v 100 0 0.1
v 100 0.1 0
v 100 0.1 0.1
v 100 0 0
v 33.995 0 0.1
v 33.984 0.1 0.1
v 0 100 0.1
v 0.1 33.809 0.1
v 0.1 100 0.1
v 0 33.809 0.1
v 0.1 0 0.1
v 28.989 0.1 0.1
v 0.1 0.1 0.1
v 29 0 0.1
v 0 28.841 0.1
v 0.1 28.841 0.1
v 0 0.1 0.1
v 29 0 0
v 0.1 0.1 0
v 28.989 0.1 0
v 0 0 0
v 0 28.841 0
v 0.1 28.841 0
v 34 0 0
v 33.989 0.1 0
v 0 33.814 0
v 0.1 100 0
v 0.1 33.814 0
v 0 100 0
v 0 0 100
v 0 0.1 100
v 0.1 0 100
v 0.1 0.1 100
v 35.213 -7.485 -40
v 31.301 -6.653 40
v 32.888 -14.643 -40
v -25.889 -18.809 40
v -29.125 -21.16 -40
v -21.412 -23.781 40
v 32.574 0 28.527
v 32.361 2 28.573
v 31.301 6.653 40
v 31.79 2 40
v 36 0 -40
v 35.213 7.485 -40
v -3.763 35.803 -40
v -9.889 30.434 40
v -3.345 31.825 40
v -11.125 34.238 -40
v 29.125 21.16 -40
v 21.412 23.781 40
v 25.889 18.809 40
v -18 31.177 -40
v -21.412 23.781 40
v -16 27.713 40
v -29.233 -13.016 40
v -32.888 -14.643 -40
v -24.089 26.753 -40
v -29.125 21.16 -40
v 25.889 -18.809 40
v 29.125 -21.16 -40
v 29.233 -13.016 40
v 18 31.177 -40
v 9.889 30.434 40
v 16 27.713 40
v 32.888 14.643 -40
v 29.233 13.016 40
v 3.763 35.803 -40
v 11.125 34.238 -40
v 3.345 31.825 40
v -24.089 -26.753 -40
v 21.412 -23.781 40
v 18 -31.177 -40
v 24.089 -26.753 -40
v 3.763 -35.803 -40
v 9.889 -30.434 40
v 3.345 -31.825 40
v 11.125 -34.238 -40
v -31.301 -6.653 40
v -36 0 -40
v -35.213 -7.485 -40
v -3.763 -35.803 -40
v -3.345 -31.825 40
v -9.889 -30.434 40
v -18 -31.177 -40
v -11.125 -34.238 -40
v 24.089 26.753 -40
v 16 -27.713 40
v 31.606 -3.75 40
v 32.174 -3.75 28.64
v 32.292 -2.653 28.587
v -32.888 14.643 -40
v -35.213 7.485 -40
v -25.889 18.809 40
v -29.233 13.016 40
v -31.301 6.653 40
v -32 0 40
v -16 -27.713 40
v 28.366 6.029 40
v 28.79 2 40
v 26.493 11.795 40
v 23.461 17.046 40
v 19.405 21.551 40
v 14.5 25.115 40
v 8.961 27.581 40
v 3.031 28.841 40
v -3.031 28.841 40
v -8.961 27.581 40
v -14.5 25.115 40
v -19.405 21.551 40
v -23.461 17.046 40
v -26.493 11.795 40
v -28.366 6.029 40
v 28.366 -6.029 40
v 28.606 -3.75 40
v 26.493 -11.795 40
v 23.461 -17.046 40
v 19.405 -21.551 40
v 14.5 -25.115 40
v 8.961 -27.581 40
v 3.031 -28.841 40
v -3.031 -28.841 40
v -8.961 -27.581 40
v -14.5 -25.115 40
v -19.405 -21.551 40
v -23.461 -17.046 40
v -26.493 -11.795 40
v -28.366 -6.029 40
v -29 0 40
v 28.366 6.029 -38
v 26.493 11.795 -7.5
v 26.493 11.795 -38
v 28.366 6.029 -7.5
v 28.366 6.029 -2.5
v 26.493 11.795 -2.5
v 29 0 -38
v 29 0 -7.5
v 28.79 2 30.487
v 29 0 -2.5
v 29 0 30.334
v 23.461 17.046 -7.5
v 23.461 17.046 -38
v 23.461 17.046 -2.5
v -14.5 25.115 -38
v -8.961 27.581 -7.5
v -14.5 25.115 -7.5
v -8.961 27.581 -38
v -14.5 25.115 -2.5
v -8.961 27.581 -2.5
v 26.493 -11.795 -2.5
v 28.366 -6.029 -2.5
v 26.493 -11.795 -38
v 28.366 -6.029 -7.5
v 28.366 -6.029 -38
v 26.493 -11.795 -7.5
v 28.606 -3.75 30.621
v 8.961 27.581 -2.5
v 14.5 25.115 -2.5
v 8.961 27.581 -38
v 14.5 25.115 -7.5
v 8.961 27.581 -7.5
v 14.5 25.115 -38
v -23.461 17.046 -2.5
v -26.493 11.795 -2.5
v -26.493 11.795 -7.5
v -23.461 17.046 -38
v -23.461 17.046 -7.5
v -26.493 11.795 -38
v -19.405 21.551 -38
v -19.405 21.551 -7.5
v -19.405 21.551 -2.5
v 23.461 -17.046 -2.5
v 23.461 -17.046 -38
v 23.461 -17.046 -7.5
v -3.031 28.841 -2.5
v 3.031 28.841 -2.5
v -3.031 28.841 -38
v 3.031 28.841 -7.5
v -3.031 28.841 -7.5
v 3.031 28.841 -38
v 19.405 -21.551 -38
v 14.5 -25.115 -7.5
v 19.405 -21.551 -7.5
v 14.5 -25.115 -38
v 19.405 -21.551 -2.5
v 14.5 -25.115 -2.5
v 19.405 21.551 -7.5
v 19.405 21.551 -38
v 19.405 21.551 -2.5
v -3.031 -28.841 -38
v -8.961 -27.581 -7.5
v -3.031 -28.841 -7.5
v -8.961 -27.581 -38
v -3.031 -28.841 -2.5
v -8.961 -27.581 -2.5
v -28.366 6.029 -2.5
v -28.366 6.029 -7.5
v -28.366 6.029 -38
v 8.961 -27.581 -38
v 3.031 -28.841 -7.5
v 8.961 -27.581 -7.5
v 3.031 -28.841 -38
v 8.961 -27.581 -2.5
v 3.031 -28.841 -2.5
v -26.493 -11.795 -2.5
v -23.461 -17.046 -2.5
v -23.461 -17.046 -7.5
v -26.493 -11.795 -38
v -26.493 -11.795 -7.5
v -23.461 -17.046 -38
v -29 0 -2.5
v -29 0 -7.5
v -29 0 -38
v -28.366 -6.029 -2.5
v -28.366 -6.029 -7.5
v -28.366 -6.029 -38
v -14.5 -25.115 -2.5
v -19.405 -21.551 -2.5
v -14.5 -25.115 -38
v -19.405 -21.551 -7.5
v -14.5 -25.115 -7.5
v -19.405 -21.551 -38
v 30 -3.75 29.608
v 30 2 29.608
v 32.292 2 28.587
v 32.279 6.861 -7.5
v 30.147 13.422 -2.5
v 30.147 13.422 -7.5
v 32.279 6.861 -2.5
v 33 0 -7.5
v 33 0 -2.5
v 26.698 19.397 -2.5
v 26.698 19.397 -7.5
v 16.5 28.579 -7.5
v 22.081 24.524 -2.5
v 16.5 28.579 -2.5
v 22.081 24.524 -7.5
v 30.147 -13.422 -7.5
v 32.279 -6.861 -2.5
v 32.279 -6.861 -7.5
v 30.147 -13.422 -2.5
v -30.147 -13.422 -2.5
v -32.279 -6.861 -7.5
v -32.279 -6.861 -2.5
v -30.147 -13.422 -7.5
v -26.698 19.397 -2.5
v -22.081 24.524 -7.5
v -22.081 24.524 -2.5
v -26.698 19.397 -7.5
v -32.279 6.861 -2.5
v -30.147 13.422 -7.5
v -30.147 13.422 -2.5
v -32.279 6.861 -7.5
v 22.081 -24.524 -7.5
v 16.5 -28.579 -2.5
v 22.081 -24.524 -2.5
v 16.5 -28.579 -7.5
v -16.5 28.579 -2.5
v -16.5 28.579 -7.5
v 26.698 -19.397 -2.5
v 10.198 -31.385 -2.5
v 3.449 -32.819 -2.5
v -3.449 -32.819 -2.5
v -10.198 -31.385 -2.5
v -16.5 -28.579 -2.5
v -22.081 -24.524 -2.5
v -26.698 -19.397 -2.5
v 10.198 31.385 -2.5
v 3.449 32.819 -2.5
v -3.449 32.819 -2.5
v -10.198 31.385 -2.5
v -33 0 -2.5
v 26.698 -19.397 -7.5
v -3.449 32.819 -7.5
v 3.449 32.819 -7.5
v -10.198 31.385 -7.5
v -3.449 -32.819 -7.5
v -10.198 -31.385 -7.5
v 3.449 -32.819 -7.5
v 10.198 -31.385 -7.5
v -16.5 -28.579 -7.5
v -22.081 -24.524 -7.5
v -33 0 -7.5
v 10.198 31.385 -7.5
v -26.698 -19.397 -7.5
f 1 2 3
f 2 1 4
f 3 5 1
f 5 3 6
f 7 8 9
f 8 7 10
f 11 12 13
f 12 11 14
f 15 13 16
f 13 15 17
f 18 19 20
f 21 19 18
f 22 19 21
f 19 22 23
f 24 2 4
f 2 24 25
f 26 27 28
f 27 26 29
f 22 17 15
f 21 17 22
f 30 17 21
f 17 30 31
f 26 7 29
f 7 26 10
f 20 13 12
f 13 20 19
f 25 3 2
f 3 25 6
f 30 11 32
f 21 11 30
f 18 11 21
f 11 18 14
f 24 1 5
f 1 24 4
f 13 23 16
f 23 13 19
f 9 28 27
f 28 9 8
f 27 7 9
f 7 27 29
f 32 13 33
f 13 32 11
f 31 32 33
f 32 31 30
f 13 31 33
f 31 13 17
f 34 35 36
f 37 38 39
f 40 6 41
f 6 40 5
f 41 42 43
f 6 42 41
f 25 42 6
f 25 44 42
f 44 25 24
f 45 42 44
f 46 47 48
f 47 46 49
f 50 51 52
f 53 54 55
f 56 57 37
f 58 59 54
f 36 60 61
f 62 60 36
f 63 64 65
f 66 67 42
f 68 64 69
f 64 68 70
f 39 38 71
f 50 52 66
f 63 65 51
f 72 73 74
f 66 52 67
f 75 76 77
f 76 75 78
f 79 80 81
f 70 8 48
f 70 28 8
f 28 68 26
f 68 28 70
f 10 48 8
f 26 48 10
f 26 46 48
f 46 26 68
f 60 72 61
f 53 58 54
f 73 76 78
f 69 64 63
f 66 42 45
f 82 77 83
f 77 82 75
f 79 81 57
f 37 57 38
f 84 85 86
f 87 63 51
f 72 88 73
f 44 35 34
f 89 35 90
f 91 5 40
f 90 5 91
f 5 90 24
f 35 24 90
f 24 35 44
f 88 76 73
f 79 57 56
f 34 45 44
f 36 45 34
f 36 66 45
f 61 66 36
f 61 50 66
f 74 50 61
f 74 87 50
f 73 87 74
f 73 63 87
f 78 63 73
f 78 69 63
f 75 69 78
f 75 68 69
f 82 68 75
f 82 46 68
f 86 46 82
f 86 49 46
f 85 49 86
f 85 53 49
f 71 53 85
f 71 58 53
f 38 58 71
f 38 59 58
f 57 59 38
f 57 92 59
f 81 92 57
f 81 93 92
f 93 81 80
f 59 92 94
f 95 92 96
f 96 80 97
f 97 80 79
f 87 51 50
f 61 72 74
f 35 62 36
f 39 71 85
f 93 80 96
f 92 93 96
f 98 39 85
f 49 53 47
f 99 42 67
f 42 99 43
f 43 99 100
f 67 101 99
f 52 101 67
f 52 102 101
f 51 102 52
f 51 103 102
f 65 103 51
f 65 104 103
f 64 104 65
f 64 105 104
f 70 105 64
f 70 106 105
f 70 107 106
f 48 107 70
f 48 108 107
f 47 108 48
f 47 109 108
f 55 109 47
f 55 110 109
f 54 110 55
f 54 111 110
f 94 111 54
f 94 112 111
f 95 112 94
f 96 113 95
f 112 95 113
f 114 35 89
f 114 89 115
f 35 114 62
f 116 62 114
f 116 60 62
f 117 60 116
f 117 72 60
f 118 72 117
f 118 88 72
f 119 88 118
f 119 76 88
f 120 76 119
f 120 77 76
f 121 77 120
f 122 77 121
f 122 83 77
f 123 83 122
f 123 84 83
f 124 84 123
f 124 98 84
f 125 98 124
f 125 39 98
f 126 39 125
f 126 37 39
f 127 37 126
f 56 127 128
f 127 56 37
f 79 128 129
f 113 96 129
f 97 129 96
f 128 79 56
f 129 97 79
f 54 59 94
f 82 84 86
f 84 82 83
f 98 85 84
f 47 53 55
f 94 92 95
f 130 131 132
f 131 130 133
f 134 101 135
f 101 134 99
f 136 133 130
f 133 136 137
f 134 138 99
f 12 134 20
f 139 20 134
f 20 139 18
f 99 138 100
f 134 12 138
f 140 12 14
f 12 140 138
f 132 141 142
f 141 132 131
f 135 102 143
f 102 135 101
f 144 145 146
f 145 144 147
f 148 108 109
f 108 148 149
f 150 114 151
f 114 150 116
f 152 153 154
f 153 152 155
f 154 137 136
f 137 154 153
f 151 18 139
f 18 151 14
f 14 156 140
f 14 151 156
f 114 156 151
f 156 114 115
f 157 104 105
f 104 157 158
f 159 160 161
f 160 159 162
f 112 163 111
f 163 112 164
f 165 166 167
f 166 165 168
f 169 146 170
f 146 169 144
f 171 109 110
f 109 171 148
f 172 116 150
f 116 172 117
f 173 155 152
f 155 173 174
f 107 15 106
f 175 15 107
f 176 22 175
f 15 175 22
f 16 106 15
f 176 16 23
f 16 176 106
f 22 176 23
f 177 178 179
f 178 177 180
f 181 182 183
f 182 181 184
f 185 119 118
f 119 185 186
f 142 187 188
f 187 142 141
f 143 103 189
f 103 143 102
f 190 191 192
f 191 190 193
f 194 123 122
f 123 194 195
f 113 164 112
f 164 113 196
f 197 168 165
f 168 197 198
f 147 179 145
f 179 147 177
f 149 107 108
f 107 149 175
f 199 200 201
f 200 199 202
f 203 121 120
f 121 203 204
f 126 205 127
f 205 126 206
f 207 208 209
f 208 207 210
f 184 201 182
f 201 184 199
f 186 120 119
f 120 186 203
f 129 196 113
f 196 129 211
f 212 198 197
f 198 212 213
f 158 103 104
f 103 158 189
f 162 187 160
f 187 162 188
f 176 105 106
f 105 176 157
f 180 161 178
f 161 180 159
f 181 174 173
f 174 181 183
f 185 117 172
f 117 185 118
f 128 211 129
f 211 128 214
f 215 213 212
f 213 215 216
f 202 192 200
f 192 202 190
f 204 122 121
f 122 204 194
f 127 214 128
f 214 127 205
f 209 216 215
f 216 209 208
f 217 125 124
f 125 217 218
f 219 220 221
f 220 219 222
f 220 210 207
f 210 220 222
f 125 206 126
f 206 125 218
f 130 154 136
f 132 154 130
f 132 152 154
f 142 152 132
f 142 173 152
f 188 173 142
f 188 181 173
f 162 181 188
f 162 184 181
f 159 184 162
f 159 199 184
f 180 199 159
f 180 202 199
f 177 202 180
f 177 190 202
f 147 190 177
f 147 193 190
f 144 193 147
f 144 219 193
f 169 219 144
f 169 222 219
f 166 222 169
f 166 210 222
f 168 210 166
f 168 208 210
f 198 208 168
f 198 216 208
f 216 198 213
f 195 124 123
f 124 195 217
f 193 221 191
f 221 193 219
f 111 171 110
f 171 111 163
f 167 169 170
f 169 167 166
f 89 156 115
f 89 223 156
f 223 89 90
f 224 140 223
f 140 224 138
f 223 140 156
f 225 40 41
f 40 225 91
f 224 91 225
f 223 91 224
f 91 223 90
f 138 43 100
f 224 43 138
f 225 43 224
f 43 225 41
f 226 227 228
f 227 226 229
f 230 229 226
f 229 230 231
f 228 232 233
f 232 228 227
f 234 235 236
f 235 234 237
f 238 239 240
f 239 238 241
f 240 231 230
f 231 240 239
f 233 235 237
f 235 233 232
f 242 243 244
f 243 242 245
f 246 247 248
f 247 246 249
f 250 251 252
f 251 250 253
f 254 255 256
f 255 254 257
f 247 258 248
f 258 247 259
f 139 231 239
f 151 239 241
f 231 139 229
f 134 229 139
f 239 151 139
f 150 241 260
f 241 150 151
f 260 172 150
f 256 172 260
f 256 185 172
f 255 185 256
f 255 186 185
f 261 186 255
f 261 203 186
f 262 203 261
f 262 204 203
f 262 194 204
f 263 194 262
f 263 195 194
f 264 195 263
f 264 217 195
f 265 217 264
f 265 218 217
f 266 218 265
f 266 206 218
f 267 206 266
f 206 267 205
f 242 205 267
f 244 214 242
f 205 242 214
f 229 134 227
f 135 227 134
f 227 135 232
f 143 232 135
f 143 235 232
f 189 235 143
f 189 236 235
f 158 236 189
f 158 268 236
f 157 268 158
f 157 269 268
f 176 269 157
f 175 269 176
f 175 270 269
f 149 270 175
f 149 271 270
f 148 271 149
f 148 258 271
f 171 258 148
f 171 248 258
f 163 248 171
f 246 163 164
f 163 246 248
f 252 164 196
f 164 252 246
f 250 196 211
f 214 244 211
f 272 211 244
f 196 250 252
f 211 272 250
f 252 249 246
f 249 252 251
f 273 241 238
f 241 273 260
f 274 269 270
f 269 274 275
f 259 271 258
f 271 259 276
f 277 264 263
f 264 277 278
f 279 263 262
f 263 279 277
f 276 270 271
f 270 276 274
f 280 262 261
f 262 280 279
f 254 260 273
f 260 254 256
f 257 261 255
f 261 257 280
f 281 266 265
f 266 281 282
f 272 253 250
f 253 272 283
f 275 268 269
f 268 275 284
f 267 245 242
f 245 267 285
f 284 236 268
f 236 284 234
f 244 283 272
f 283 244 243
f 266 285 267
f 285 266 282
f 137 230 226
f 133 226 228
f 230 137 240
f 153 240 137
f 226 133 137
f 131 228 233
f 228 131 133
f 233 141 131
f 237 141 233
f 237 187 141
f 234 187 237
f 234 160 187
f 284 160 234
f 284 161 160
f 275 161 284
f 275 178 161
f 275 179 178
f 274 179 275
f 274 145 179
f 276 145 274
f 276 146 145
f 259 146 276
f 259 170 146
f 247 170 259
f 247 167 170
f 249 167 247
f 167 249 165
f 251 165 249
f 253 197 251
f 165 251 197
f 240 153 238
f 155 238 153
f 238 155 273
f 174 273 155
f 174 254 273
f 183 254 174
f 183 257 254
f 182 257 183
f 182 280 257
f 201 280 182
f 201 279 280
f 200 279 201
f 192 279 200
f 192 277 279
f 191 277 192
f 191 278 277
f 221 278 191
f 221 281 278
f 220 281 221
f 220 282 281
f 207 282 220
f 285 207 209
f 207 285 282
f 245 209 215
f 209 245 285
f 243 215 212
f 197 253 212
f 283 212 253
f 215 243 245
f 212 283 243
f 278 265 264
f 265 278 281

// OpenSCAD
    // Combined Scene

    // Permanent Model
    
    // Permanent Model (Black)
    color([0, 0, 0]) {
        // Your permanent model code here
        cube([100,0.1,0.1], center = false);
        cube([0.1,100,0.1], center = false);
        cube([0.1,0.1,100], center = false);
    }
    

    // Dynamic Model
    difference() {
    // Outer mug body with a flared rim
    difference() {
        cylinder(h=80, r1=36, r2=32, center=true); // Flaring top for aesthetics
        translate([0, 0, 1])
            cylinder(h=78, r=29, center=true); // Inner hollow space for fluid containment
    }
    
    // Handle of the mug
    translate([36, 0, 40])
        rotate([90, 0, 0])
            difference() {
                // Outer part of handle
                scale([1, 1, 0.5])
                    cylinder(h=15, r=12, center=true);

                // Inner cutout of handle
                translate([-6, -6, -7])
                    scale([1, 1, 0.5])
                        cylinder(h=20, r=9, center=true);
            }
    
    // Slightly round the base for stability
    translate([0, 0, -5])
        cylinder(h=5, r=33, center=true);
}
    
